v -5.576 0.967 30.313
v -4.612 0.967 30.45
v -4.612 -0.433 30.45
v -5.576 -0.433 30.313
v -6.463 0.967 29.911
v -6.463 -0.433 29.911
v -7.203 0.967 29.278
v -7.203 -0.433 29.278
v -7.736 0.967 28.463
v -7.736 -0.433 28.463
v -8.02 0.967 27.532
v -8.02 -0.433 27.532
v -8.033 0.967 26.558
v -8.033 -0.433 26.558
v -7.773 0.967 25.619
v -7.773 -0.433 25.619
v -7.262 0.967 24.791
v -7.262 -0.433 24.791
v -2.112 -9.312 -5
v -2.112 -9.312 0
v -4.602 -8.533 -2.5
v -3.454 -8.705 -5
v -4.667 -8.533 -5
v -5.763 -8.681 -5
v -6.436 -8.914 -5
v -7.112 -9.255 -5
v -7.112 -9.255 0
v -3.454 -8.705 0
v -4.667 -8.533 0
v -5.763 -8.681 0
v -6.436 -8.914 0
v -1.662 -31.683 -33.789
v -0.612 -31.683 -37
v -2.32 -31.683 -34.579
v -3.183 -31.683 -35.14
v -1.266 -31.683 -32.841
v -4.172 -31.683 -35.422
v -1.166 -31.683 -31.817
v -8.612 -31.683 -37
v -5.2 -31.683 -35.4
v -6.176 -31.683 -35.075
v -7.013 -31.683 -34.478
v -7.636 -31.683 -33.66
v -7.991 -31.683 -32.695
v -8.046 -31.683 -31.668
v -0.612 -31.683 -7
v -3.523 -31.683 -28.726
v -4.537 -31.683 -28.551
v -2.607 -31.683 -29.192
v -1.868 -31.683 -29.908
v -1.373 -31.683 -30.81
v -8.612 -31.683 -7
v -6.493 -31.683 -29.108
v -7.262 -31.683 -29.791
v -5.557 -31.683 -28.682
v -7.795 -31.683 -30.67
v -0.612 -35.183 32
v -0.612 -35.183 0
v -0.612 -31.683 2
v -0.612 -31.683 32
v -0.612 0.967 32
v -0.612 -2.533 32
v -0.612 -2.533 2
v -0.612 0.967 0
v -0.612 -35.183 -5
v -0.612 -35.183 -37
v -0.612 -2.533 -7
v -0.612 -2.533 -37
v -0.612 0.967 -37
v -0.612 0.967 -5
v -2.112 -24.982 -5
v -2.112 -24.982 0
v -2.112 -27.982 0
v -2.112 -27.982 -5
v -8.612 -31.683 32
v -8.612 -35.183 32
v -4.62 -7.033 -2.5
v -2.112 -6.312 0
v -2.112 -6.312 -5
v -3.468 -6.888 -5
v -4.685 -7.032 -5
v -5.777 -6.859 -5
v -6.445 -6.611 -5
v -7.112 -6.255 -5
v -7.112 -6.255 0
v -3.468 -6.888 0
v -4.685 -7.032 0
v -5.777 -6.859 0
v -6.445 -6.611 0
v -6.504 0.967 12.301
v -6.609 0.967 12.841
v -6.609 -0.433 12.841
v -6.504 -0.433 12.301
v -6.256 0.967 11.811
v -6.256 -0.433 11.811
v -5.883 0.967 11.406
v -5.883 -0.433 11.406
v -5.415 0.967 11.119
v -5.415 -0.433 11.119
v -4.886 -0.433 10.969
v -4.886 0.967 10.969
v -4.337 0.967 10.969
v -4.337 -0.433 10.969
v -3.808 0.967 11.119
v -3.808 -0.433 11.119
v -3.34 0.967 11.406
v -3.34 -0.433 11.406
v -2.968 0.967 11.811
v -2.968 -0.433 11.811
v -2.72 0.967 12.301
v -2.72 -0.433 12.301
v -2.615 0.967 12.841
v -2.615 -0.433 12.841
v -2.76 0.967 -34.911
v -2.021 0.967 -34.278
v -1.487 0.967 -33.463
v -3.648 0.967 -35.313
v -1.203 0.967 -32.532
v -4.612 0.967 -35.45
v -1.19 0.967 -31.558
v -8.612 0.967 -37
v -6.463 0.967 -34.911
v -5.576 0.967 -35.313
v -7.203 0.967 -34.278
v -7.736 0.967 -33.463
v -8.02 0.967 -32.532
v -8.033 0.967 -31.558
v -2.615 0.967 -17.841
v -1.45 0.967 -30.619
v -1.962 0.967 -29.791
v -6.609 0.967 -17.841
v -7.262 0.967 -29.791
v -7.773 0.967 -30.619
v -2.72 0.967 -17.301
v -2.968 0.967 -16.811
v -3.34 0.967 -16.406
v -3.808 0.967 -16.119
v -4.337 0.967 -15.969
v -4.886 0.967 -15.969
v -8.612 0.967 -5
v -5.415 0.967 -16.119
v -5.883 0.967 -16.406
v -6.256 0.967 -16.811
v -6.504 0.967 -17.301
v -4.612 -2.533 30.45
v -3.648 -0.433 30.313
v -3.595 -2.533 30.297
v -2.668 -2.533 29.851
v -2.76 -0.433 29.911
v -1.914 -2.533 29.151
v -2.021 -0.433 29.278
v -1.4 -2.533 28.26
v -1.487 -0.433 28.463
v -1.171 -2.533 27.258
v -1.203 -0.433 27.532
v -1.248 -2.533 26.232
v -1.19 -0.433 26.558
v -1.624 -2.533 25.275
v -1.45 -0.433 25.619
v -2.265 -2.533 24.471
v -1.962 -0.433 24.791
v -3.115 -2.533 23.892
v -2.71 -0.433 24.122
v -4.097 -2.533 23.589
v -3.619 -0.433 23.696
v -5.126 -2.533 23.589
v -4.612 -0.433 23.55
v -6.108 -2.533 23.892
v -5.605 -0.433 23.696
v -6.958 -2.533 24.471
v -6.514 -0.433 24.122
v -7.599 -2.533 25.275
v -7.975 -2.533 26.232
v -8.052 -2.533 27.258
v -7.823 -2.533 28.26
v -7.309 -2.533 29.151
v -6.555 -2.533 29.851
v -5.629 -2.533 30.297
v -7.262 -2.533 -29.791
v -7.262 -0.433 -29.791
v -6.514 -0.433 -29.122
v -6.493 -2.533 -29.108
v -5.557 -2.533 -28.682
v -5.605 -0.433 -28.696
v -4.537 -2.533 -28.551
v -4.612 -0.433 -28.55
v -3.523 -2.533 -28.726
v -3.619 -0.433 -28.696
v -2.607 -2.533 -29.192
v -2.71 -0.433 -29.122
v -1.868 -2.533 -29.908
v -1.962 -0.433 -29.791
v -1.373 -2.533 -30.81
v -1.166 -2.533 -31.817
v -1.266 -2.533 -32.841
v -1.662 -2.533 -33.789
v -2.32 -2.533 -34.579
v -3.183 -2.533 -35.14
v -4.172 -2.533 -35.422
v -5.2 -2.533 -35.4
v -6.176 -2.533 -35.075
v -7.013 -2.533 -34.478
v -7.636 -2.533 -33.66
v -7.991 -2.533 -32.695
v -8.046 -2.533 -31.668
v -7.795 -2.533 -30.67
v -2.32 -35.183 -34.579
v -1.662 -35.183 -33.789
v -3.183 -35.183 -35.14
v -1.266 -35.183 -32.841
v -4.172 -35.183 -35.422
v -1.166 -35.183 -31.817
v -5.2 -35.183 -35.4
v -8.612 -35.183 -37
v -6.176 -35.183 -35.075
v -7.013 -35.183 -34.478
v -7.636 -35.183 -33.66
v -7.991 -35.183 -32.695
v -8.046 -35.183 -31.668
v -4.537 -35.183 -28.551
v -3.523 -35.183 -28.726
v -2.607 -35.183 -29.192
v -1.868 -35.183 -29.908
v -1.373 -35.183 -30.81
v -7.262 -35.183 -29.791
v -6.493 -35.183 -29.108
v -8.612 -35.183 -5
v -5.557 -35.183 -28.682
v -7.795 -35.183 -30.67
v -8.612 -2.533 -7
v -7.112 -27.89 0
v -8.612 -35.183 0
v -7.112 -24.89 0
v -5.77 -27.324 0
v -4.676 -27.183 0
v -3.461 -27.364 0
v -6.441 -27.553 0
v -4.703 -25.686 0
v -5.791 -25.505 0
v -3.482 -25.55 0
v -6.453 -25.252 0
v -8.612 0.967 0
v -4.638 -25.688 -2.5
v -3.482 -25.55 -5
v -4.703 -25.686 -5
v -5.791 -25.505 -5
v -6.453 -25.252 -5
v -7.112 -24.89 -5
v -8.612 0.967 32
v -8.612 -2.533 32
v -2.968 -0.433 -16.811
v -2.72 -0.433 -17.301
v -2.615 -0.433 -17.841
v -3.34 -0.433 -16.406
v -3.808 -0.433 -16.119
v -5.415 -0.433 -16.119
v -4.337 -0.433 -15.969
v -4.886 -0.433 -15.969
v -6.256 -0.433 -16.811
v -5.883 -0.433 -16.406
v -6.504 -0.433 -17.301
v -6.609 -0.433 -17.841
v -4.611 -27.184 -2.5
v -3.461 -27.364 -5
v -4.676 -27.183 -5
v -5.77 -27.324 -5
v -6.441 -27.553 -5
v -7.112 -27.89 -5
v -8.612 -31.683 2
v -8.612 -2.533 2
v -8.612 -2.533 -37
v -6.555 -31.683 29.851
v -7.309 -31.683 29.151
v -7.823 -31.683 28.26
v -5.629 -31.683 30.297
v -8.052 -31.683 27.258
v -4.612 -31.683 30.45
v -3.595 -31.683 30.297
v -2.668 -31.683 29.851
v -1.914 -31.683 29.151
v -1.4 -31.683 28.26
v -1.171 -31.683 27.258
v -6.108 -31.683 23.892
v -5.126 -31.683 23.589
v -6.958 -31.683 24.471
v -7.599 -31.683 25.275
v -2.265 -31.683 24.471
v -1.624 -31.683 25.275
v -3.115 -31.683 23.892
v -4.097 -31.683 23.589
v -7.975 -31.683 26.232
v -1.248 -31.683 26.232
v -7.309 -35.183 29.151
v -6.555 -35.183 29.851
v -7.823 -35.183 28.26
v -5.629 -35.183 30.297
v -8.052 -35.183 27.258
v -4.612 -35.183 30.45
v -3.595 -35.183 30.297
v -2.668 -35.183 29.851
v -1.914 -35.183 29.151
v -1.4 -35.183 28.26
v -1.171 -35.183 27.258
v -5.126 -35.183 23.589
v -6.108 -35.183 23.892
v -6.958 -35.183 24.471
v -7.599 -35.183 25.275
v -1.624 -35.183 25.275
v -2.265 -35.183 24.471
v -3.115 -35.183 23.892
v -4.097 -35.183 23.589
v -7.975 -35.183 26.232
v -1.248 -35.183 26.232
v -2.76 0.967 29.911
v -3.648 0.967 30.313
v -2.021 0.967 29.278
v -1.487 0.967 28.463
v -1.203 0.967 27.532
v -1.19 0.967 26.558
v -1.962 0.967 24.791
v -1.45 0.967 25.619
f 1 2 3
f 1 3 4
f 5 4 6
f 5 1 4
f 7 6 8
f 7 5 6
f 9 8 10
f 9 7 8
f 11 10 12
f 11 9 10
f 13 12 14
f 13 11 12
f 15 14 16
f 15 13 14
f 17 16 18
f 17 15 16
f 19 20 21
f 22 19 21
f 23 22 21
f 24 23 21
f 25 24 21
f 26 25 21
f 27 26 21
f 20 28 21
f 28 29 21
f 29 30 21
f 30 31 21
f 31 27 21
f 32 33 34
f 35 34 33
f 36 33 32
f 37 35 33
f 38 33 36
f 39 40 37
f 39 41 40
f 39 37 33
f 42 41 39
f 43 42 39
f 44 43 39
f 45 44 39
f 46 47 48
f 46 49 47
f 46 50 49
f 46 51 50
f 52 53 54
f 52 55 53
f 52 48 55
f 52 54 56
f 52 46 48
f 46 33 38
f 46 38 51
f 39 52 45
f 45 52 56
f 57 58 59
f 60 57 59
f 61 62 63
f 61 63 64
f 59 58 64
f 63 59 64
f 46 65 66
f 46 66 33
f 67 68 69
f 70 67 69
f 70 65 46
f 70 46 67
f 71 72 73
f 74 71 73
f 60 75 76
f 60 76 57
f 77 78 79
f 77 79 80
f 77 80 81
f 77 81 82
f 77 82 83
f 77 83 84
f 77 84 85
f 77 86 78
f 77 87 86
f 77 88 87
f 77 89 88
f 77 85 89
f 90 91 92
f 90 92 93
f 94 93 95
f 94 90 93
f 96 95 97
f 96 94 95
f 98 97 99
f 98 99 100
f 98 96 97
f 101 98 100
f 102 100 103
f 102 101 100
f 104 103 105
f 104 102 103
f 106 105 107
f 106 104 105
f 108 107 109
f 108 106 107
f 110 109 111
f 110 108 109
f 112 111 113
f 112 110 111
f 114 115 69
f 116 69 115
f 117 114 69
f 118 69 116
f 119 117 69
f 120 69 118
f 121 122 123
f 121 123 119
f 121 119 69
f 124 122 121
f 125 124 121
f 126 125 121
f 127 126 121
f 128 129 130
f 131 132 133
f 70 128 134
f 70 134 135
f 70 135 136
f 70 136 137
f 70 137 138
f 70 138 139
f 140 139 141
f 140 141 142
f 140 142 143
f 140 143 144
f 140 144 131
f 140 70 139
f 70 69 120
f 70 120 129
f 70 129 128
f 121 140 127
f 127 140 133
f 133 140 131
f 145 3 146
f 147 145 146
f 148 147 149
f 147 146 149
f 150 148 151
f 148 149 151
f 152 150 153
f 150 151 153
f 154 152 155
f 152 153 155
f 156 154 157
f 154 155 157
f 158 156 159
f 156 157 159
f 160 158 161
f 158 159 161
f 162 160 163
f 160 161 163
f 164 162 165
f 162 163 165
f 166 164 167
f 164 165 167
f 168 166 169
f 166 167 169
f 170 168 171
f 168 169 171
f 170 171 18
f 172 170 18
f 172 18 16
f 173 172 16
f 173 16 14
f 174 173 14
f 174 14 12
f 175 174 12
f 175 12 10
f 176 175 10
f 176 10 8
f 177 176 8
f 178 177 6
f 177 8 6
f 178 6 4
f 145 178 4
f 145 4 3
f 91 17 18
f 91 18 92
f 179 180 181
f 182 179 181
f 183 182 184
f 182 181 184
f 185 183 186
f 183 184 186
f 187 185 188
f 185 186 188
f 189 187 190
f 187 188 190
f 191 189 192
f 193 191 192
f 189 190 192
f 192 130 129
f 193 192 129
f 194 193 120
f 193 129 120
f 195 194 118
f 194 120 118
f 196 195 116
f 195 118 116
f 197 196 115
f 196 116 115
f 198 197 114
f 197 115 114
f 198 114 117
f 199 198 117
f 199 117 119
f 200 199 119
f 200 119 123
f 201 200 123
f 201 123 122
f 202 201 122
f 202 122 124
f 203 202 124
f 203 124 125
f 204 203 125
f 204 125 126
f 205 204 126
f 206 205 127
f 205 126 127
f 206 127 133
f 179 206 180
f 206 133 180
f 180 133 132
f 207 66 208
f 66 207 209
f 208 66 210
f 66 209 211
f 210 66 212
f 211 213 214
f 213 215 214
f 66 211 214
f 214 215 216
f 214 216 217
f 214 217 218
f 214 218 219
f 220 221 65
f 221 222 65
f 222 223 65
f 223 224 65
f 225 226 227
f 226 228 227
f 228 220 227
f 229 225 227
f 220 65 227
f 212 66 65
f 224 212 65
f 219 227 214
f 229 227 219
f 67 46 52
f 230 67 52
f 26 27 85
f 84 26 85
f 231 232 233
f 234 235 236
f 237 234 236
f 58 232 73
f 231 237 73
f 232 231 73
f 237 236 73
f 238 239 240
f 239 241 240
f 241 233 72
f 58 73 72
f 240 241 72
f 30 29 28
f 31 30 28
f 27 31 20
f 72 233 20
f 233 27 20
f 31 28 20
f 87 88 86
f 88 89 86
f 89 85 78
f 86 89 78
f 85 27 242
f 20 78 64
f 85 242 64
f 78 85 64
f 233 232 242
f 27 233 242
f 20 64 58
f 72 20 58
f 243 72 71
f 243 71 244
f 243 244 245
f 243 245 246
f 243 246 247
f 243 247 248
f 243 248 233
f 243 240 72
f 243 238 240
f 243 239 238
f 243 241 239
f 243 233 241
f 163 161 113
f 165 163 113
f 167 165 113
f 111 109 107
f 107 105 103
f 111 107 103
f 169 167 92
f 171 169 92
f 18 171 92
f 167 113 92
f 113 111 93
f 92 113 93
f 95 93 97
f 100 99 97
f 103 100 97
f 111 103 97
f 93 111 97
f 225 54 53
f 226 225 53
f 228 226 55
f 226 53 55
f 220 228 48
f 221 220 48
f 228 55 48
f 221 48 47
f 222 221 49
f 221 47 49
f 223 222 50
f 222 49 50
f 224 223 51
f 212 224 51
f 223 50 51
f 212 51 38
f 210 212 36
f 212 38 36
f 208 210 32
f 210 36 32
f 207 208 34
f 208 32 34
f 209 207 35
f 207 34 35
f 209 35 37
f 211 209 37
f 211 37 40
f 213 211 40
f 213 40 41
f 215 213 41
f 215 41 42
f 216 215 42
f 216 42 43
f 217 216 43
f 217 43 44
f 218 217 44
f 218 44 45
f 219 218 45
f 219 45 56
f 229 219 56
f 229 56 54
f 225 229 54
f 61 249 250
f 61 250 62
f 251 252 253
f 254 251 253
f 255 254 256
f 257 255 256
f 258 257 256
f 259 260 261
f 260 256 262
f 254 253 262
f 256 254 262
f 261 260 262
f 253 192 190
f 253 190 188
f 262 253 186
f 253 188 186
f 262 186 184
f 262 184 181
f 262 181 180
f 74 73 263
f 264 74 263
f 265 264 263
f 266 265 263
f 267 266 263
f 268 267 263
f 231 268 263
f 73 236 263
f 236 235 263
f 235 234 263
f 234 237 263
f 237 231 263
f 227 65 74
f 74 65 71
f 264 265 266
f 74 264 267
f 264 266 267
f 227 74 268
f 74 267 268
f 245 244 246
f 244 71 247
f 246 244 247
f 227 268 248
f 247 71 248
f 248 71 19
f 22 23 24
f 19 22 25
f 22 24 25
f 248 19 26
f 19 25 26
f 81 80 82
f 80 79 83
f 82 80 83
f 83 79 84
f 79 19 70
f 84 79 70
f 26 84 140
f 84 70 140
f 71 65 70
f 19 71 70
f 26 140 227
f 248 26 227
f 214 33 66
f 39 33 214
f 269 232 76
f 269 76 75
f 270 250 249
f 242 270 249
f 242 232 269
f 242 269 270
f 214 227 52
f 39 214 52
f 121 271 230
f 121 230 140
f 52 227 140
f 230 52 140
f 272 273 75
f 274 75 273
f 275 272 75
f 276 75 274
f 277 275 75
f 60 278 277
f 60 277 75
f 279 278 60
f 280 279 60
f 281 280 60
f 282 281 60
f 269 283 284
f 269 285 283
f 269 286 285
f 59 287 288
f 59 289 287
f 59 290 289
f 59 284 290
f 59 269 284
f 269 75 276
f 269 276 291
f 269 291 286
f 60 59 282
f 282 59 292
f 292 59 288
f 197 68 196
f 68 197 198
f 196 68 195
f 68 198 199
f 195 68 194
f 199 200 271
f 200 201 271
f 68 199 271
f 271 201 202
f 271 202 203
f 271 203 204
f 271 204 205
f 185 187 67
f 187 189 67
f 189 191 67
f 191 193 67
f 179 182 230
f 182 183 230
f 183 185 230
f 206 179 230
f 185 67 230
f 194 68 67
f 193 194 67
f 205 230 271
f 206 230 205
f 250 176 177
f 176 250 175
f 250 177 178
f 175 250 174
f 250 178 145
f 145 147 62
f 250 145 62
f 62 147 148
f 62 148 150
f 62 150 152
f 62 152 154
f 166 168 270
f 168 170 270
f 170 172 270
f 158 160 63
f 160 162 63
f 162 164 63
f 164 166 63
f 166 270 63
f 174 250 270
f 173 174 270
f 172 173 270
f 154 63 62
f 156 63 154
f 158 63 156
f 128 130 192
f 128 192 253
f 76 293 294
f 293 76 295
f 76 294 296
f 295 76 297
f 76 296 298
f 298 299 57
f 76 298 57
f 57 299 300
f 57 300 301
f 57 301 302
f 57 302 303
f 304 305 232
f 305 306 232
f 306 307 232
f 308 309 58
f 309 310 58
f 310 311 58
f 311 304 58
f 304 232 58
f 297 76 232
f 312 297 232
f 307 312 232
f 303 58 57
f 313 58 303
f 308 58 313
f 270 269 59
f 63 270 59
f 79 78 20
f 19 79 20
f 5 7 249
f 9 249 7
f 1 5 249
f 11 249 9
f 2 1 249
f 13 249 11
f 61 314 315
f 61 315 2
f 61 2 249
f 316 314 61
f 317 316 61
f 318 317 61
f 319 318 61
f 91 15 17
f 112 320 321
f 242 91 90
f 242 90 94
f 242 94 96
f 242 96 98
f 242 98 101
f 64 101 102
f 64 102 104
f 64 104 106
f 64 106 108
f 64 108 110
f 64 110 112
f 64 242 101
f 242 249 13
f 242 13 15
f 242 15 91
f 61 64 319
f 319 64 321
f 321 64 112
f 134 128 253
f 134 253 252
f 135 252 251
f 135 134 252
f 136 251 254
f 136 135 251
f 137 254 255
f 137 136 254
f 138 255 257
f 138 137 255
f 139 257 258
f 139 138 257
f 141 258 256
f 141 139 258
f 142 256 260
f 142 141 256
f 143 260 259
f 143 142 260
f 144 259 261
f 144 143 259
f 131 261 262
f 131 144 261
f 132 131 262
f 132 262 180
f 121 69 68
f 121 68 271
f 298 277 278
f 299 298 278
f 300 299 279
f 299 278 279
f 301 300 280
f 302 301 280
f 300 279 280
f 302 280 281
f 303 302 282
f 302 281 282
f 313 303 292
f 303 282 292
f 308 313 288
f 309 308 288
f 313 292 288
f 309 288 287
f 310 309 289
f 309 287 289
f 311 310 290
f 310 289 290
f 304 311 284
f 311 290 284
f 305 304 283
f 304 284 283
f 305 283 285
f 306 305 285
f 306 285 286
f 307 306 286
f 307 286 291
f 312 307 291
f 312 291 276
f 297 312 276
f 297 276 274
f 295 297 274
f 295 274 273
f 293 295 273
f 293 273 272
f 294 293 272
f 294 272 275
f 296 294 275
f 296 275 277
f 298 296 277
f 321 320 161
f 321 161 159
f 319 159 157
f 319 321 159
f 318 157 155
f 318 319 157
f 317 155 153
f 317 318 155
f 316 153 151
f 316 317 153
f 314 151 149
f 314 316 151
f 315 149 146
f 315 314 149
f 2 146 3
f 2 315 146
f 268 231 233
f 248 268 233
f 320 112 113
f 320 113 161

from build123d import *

# Parameters (mm, degrees)
SKETCH2_W            = 8
SKETCH2_H            = 36.15
BOSS_EXTRUDE2_DEPTH  = 2
SKETCH11_W           = 8
SKETCH11_H           = 3.5
BOSS_EXTRUDE8_DEPTH  = 30
CUT_EXTRUDE1_DEPTH   = 1.4
BOSS_EXTRUDE9_DEPTH  = 5
SKETCH15_W           = 8
SKETCH15_H           = 36.15
BOSS_EXTRUDE10_DEPTH = 2
SKETCH16_W           = 8
SKETCH16_H           = 3.5
BOSS_EXTRUDE11_DEPTH = 30
CUT_EXTRUDE4_DEPTH   = 1.4
SKETCH22_R           = 3.45
CUT_EXTRUDE6_DEPTH   = 53.440272523
SKETCH23_R           = 3.45
CUT_EXTRUDE7_DEPTH   = 53.440272523


with BuildPart() as part:
    # Sketch2 → Boss-Extrude2 (new body)
    with BuildSketch(Plane.XY):
        with Locations((-4.61160109, -17.108451256)):
            Rectangle(SKETCH2_W, SKETCH2_H)
    extrude(amount=BOSS_EXTRUDE2_DEPTH)

    # Sketch11 → Boss-Extrude8 (add)
    with BuildSketch(Plane.XY.offset(2)):
        with Locations((-4.61160109, -0.783451256)):
            Rectangle(SKETCH11_W, SKETCH11_H)
        with Locations((-4.61160109, -33.433451256)):
            Rectangle(SKETCH11_W, SKETCH11_H)
    extrude(amount=BOSS_EXTRUDE8_DEPTH)

    # Sketch12 → Cut-Extrude1 (cut)
    with BuildSketch(Plane(origin=(0, 0.966548744, 0), x_dir=(1, 0, 0), z_dir=(0, 1, 0))):
        with BuildLine():
            Line((-2.614580209, -12.840878033), (-1.96160109, -24.790927797))
            ThreePointArc((-1.96160109, -24.790927797), (-4.61160109, -30.45), (-7.26160109, -24.790927797))
            Line((-7.26160109, -24.790927797), (-6.60862197, -12.840878033))
            ThreePointArc((-6.60862197, -12.840878033), (-4.61160109, -10.95), (-2.614580209, -12.840878033))
        make_face()
    extrude(amount=-CUT_EXTRUDE1_DEPTH, mode=Mode.SUBTRACT)

    # Sketch14 → Boss-Extrude9 (add)
    with BuildSketch(Plane(origin=(0, 0, 0), x_dir=(-1, 0, 0), z_dir=(0, 0, -1))):
        with BuildLine():
            Line((2.11160109, -6.31186882), (2.11160109, -9.31186882))
            add(Edge.make_bspline(
                [(2.11160109, -9.31186882), (4.5926591, -7.783279628), (7.11160109, -9.254861144)],
                knots=[0, 0, 0, 1, 1, 1], degree=2))
            Line((7.11160109, -9.254861144), (7.11160109, -6.254861144))
            add(Edge.make_bspline(
                [(2.11160109, -6.31186882), (4.628213222, -7.783477077), (7.11160109, -6.254861144)],
                knots=[0, 0, 0, 1, 1, 1], degree=2))
        make_face()
        with BuildLine():
            Line((2.11160109, -24.982494275), (2.11160109, -27.982494275))
            add(Edge.make_bspline(
                [(2.11160109, -27.982494275), (4.610423864, -26.431016384), (7.11160109, -27.889739685)],
                knots=[0, 0, 0, 1, 1, 1], degree=2))
            Line((7.11160109, -27.889739685), (7.11160109, -24.889739685))
            add(Edge.make_bspline(
                [(2.11160109, -24.982494275), (4.664129849, -26.440271128), (7.11160109, -24.889739685)],
                knots=[0, 0, 0, 1, 1, 1], degree=2))
        make_face()
    extrude(amount=BOSS_EXTRUDE9_DEPTH)

    # Sketch15 → Boss-Extrude10 (add)
    with BuildSketch(Plane(origin=(0, 0, -5), x_dir=(-1, 0, 0), z_dir=(0, 0, -1))):
        with Locations((4.61160109, -17.108451256)):
            Rectangle(SKETCH15_W, SKETCH15_H)
    extrude(amount=BOSS_EXTRUDE10_DEPTH)

    # Sketch16 → Boss-Extrude11 (add)
    with BuildSketch(Plane(origin=(0, 0, -7), x_dir=(-1, 0, 0), z_dir=(0, 0, -1))):
        with Locations((4.61160109, -0.783451256)):
            Rectangle(SKETCH16_W, SKETCH16_H)
        with Locations((4.61160109, -33.433451256)):
            Rectangle(SKETCH16_W, SKETCH16_H)
    extrude(amount=BOSS_EXTRUDE11_DEPTH)

    # Sketch20 → Cut-Extrude4 (cut)
    with BuildSketch(Plane(origin=(0, 0.966548744, 0), x_dir=(1, 0, 0), z_dir=(0, 1, 0))):
        with BuildLine():
            Line((-6.60862197, 17.840878033), (-7.26160109, 29.790927797))
            ThreePointArc((-7.26160109, 29.790927797), (-4.61160109, 35.45), (-1.96160109, 29.790927797))
            Line((-1.96160109, 29.790927797), (-2.614580209, 17.840878033))
            ThreePointArc((-2.614580209, 17.840878033), (-4.61160109, 15.95), (-6.60862197, 17.840878033))
        make_face()
    extrude(amount=-CUT_EXTRUDE4_DEPTH, mode=Mode.SUBTRACT)

    # Sketch22 → Cut-Extrude6 (cut, through all)
    with BuildSketch(Plane(origin=(0, 0.966548744, 0), x_dir=(1, 0, 0), z_dir=(0, 1, 0))):
        with Locations(Location((-4.61160109, -27, 0), (0, 0, 270))):
            Circle(SKETCH22_R)
    extrude(amount=-CUT_EXTRUDE6_DEPTH, mode=Mode.SUBTRACT)

    # Sketch23 → Cut-Extrude7 (cut, through all)
    with BuildSketch(Plane(origin=(0, 0.966548744, 0), x_dir=(1, 0, 0), z_dir=(0, 1, 0))):
        with Locations(Location((-4.61160109, 32, 0), (0, 0, 219.814997755))):
            Circle(SKETCH23_R)
    extrude(amount=-CUT_EXTRUDE7_DEPTH, mode=Mode.SUBTRACT)


solid = part.part
